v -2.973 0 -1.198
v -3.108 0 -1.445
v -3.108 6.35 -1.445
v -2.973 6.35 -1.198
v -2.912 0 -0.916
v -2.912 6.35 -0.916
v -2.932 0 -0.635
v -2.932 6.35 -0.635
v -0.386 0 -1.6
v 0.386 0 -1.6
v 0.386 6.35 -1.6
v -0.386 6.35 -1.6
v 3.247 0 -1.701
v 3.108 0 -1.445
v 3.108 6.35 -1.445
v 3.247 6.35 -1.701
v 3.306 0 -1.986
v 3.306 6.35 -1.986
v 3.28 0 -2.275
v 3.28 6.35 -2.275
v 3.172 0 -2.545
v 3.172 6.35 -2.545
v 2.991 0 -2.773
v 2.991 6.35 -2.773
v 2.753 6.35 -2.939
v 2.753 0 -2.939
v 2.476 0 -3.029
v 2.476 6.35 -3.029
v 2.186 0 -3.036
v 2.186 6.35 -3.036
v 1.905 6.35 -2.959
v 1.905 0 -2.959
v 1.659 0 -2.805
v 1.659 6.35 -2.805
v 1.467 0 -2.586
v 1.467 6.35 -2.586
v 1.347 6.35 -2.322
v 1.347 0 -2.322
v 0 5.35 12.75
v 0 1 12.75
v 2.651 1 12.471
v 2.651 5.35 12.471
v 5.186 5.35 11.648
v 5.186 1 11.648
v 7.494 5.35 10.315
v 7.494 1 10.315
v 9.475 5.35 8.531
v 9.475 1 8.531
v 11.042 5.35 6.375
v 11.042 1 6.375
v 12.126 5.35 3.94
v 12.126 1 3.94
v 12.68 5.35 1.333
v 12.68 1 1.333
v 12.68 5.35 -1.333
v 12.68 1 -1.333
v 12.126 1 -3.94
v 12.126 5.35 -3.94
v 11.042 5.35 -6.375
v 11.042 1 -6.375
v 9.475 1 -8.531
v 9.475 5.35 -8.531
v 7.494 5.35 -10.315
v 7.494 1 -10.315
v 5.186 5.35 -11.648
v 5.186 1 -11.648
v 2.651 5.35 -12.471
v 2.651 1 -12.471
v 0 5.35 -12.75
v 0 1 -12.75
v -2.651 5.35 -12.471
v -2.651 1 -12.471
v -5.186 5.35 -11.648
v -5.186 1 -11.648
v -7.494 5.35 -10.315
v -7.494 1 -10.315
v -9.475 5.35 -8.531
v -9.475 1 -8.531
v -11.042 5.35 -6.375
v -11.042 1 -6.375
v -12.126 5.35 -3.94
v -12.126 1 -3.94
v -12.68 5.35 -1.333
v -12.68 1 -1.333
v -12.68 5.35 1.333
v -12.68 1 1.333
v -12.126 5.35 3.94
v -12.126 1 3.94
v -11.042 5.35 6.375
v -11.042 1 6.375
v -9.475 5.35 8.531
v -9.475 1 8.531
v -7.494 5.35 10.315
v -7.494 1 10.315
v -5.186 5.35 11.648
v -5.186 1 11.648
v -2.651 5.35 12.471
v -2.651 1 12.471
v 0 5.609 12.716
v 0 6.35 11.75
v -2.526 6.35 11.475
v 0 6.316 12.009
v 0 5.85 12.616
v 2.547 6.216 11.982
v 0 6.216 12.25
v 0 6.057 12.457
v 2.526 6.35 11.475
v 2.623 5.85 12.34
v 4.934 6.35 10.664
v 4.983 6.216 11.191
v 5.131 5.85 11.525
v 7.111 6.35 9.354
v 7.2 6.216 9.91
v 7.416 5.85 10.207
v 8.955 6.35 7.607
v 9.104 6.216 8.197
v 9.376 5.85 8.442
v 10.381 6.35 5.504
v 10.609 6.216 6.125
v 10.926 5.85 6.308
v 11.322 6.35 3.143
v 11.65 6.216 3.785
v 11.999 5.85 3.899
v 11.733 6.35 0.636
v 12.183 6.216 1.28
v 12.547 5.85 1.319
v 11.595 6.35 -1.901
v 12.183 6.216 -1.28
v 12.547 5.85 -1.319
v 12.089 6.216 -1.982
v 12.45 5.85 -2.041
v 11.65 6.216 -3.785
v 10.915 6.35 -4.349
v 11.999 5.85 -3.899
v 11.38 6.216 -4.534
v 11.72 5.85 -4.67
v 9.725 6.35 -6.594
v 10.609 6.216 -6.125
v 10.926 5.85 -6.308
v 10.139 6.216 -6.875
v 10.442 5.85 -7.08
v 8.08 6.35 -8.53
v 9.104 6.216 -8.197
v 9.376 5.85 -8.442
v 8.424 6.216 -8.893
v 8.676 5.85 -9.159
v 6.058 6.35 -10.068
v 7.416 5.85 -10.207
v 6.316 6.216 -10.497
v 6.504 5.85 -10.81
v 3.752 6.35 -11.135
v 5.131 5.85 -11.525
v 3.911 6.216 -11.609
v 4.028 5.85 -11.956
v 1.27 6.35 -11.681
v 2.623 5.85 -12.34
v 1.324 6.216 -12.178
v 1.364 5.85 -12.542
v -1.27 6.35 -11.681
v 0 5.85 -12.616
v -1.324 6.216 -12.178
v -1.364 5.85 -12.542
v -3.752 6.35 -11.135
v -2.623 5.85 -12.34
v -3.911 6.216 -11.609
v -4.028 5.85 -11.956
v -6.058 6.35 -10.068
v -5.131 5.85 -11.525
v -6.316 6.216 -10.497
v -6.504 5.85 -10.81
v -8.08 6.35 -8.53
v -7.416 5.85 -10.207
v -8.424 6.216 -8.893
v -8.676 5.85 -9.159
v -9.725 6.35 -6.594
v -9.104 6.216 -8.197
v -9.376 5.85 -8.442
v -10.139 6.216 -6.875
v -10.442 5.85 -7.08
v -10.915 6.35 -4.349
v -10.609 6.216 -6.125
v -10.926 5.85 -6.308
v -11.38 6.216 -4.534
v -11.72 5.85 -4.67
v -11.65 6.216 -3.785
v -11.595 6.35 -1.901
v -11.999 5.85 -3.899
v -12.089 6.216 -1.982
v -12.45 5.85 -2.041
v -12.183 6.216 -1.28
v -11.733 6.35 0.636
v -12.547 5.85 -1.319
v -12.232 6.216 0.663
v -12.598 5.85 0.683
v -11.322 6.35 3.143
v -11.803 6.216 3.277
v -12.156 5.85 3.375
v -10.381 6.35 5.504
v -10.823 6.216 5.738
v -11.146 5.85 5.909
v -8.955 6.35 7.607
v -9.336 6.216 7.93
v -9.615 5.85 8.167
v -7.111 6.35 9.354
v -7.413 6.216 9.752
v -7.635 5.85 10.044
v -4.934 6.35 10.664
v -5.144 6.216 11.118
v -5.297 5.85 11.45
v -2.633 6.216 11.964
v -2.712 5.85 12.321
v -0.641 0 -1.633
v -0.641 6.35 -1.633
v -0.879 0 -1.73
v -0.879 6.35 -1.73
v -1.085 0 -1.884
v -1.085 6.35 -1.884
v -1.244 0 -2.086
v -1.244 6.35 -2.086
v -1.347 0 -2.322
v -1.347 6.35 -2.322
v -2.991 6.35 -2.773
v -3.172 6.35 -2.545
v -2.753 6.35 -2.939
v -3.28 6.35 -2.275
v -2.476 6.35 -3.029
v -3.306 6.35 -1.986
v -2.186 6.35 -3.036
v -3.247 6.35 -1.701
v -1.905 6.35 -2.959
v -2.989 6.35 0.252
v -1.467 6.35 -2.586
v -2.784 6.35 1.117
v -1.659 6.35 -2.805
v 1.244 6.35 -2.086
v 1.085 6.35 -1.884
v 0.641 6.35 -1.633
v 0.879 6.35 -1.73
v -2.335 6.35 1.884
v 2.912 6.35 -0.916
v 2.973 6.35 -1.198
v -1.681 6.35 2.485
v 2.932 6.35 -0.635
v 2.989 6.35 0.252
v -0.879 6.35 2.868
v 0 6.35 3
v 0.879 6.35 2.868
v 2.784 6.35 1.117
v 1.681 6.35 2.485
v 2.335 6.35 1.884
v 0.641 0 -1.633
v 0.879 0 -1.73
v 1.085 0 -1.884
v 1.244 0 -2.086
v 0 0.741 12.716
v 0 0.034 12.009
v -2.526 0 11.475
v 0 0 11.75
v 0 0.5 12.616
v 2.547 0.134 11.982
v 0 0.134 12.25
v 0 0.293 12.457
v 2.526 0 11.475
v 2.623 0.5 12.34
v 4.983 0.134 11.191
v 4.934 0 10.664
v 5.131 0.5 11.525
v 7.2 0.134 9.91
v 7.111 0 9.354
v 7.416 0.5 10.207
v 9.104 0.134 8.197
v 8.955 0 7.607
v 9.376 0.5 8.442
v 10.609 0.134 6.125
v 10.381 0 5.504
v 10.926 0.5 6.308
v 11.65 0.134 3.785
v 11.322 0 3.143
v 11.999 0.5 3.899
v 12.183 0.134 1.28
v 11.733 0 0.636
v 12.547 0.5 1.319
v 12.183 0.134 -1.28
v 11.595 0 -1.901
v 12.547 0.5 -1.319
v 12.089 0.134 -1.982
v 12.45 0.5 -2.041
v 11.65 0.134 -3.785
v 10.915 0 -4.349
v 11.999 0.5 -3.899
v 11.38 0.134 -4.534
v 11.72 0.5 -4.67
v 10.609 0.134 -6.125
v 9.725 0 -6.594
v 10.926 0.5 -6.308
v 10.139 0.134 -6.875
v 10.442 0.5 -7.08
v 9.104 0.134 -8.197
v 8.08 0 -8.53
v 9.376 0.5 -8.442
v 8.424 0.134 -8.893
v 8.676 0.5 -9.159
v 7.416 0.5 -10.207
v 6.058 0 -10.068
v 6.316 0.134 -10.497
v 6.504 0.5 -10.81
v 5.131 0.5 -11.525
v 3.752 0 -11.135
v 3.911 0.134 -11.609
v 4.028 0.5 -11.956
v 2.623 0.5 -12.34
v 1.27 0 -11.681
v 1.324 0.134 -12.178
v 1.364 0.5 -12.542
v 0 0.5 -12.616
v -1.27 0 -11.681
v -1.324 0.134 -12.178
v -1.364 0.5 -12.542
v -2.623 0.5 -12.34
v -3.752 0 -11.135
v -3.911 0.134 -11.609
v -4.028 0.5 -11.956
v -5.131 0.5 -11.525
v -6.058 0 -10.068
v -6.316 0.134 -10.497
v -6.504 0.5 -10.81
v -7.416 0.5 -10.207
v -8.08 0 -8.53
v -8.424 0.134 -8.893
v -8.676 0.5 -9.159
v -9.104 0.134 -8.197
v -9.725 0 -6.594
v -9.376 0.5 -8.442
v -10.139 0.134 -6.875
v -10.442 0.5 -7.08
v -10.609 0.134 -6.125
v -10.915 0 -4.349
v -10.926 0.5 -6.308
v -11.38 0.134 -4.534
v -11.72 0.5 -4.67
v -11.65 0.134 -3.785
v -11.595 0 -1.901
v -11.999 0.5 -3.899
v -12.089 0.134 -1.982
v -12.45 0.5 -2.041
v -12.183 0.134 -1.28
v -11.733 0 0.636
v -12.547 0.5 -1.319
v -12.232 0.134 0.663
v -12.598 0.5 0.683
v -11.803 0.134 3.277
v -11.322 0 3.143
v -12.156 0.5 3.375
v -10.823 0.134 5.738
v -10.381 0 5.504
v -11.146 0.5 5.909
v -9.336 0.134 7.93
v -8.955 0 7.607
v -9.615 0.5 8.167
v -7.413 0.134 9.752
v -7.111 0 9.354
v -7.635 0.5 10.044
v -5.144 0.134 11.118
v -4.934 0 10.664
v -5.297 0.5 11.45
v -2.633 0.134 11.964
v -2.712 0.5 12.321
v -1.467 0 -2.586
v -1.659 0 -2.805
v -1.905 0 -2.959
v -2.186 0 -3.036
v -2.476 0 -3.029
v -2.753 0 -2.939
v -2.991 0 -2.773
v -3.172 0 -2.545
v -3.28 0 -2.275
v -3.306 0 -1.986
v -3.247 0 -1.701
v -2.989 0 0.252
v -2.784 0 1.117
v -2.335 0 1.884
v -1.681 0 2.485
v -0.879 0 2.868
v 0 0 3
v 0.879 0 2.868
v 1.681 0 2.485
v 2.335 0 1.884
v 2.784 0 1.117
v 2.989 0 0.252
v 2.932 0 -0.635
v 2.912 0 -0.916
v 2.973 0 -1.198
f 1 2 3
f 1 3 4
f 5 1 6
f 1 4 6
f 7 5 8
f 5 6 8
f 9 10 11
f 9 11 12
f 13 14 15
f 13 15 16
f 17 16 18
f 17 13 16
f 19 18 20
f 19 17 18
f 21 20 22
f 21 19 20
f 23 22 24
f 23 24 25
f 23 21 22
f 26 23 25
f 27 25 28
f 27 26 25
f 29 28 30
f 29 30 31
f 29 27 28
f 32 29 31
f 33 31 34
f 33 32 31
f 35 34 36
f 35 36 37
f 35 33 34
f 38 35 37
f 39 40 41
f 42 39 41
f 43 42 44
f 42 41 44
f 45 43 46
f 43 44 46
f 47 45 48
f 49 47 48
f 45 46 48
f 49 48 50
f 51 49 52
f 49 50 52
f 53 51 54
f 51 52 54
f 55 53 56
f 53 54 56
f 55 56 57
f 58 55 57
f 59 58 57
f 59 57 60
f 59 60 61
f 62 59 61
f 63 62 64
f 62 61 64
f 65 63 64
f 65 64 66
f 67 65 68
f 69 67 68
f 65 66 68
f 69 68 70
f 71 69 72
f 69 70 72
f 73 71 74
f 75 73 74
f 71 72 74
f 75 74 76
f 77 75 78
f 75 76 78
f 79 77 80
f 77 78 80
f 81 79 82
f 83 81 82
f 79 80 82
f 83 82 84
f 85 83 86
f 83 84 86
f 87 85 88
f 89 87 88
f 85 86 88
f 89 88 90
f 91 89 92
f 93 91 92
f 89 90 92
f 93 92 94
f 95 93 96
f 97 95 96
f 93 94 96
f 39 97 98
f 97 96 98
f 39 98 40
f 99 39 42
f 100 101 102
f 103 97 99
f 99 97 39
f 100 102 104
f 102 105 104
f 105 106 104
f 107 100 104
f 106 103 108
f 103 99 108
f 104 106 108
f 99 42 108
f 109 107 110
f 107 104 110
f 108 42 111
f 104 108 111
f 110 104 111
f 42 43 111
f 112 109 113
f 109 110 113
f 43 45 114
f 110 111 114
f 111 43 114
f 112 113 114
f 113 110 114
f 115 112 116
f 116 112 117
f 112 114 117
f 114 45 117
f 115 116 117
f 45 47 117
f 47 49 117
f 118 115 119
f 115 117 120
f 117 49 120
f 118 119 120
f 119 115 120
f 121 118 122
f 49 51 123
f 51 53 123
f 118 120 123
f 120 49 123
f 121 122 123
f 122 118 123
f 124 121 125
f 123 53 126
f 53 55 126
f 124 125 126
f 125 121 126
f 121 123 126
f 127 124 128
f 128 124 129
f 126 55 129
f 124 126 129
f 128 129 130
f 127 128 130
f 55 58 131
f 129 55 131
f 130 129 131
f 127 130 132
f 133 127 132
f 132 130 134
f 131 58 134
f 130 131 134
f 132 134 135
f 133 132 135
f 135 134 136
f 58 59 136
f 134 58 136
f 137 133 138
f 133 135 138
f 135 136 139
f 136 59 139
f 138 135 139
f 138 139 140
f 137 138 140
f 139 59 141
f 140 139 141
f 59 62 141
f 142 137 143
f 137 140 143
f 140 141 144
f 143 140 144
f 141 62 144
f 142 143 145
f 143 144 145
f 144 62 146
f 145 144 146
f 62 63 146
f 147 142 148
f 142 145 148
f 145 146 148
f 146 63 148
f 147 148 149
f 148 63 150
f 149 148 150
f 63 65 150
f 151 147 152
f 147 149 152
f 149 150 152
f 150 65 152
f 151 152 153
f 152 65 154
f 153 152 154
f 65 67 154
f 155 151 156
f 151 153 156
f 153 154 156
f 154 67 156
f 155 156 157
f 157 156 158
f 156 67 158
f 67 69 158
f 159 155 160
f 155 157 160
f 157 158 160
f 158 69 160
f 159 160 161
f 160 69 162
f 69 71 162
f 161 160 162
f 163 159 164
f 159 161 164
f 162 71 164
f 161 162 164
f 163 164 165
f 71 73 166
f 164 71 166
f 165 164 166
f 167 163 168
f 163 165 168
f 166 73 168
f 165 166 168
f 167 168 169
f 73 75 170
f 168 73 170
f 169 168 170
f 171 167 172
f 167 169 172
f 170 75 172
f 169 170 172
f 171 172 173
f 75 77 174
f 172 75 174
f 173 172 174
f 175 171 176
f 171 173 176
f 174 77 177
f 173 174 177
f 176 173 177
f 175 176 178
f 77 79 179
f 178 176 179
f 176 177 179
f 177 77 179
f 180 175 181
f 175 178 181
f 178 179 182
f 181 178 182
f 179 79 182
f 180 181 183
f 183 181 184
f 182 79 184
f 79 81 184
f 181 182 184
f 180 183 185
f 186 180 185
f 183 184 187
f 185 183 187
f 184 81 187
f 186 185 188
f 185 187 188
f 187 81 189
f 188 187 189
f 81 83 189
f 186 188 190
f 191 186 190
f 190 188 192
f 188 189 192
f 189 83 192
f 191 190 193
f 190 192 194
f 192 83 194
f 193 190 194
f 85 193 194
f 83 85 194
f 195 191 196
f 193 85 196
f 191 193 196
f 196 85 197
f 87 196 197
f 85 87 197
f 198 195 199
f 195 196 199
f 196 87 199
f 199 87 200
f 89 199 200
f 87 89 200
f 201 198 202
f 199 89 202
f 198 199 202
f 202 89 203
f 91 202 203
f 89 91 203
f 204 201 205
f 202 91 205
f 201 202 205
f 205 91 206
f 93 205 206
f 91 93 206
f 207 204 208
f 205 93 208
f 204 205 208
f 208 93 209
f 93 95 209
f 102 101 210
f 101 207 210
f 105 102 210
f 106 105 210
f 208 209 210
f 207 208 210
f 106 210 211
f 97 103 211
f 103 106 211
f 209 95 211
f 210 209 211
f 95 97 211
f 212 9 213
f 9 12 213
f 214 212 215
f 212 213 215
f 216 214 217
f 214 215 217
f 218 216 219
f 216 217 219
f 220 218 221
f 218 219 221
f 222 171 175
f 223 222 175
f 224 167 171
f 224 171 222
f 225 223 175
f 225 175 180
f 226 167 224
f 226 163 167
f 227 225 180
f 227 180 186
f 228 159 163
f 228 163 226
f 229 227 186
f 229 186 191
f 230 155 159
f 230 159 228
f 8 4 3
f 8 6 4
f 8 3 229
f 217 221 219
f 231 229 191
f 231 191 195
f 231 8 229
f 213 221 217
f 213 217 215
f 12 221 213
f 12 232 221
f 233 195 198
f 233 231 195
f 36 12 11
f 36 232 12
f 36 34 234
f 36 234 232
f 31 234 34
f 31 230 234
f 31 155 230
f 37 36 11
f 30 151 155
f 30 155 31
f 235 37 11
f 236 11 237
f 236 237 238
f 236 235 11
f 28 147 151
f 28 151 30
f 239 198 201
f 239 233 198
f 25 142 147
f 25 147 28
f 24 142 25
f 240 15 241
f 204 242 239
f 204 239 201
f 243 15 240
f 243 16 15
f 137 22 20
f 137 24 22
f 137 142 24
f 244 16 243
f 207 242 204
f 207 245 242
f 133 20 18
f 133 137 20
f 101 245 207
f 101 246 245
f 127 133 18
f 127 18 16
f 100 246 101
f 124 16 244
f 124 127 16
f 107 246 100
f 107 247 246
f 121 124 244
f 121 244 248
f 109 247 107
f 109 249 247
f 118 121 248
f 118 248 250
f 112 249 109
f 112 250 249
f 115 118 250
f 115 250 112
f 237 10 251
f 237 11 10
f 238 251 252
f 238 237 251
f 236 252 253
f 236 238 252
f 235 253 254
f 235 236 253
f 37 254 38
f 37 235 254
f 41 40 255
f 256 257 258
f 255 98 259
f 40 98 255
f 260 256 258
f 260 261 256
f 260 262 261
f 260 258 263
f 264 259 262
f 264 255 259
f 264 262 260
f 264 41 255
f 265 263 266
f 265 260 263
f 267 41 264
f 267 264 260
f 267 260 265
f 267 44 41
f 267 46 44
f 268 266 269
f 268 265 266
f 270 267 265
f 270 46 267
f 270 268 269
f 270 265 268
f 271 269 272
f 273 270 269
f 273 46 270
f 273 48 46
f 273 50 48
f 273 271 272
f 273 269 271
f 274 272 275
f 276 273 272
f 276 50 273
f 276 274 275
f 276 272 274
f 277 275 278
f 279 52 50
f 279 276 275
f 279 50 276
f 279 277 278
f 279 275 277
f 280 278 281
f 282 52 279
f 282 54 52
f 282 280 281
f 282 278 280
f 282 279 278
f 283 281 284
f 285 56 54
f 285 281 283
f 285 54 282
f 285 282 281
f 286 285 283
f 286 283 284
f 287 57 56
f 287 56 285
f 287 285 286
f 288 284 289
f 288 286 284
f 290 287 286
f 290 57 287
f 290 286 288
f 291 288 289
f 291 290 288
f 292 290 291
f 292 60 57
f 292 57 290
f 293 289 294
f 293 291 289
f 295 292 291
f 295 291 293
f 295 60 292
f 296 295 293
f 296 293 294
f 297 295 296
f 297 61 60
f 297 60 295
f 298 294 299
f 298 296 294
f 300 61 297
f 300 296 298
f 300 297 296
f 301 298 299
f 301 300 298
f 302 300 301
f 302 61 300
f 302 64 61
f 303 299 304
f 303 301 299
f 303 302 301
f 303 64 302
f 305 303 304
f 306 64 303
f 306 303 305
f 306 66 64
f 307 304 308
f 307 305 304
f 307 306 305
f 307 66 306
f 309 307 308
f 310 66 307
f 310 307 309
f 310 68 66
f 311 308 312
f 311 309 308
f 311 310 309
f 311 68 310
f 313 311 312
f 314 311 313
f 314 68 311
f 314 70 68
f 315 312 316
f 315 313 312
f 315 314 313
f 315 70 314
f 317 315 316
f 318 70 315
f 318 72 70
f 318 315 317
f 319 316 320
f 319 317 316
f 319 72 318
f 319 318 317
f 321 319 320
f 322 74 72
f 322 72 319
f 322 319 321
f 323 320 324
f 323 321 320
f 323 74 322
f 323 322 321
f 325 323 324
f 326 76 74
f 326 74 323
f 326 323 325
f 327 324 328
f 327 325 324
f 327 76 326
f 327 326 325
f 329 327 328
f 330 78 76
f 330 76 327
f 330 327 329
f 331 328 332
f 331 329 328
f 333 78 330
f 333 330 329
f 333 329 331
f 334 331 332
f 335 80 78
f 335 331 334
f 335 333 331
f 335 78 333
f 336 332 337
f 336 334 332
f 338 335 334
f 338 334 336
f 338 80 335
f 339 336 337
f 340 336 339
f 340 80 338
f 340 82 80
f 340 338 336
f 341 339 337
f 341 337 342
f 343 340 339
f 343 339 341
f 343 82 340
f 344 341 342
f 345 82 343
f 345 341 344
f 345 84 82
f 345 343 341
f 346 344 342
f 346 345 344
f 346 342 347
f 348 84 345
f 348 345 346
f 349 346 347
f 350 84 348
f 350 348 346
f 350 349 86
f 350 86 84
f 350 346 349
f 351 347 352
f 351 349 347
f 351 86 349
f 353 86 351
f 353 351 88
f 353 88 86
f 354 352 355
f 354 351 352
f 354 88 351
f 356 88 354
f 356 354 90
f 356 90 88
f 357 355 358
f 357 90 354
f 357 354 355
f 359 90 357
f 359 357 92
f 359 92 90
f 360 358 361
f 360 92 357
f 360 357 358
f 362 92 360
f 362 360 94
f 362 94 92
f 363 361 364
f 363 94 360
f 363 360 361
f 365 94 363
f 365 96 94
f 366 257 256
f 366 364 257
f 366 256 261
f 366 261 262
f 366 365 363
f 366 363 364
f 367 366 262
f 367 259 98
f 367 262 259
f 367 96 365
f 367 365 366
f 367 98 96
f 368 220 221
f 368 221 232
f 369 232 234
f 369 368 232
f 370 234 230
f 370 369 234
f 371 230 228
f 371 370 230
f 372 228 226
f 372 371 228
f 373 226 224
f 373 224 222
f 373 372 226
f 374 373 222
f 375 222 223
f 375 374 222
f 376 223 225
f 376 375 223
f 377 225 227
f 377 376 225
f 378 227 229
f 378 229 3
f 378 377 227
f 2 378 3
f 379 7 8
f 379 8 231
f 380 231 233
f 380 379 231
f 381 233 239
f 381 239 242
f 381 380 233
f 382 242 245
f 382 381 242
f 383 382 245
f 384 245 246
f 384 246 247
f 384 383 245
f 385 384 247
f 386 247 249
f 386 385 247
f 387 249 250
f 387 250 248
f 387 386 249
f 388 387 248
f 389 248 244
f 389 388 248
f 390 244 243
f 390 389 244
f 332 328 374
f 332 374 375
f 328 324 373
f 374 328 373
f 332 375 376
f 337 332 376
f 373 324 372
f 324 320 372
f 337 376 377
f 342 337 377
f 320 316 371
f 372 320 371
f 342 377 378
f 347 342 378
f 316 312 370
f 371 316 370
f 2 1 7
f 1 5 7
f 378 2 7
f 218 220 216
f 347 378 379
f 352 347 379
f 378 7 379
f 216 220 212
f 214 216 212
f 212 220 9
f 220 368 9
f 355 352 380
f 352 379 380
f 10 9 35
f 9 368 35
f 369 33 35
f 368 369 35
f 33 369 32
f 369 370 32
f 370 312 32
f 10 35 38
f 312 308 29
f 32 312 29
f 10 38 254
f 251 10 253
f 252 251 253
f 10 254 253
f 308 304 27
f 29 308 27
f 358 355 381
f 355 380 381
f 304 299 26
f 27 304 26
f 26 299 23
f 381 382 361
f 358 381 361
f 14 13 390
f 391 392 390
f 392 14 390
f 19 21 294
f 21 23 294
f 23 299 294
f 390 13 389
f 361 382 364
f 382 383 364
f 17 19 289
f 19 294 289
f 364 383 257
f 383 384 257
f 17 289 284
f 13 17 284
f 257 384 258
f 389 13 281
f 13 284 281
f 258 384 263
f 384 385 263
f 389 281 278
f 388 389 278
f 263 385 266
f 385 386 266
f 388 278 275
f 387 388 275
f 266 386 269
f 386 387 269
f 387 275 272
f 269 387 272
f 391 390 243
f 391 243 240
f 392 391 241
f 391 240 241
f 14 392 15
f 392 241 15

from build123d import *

# Parameters (mm, degrees)
SKETCH1_R           = 12.75
BOSS_EXTRUDE1_DEPTH = 6.35
FILLET1_R           = 1
FILLET2_R           = 1


with BuildPart() as part:
    # Sketch1 → Boss-Extrude1 (new body)
    with BuildSketch(Plane(origin=(0, 0, 0), x_dir=(1, 0, 0), z_dir=(0, 1, 0))):
        with Locations(Location((0, 0, 0), (0, 0, 270))):
            Circle(SKETCH1_R)
        with BuildLine():
            Line((1.411048864, 1.6), (-1.411048864, 1.6))
            ThreePointArc((-1.411048864, 1.6), (-2.617971935, 2.994195507), (-2.768208587, 1.156296337))
            ThreePointArc((-2.768208587, 1.156296337), (0, -3), (2.768208587, 1.156296337))
            ThreePointArc((2.768208587, 1.156296337), (2.617971935, 2.994195507), (1.411048864, 1.6))
        make_face(mode=Mode.SUBTRACT)
    extrude(amount=BOSS_EXTRUDE1_DEPTH)

    # Fillet1
    fillet1_edges = [part.edges().sort_by_distance(p)[0] for p in [
        (2.768208587, 3.175, -1.156296337),
        (1.411048864, 3.175, -1.6),
        (-1.411048864, 3.175, -1.6),
        (-2.768208587, 3.175, -1.156296337),
    ]]
    fillet(fillet1_edges, radius=FILLET1_R)

    # Fillet2
    fillet2_edges = [part.edges().sort_by_distance(p)[0] for p in [
        (0, 0, -12.75),
        (0, 6.35, -12.75),
    ]]
    fillet(fillet2_edges, radius=FILLET2_R)


solid = part.part
